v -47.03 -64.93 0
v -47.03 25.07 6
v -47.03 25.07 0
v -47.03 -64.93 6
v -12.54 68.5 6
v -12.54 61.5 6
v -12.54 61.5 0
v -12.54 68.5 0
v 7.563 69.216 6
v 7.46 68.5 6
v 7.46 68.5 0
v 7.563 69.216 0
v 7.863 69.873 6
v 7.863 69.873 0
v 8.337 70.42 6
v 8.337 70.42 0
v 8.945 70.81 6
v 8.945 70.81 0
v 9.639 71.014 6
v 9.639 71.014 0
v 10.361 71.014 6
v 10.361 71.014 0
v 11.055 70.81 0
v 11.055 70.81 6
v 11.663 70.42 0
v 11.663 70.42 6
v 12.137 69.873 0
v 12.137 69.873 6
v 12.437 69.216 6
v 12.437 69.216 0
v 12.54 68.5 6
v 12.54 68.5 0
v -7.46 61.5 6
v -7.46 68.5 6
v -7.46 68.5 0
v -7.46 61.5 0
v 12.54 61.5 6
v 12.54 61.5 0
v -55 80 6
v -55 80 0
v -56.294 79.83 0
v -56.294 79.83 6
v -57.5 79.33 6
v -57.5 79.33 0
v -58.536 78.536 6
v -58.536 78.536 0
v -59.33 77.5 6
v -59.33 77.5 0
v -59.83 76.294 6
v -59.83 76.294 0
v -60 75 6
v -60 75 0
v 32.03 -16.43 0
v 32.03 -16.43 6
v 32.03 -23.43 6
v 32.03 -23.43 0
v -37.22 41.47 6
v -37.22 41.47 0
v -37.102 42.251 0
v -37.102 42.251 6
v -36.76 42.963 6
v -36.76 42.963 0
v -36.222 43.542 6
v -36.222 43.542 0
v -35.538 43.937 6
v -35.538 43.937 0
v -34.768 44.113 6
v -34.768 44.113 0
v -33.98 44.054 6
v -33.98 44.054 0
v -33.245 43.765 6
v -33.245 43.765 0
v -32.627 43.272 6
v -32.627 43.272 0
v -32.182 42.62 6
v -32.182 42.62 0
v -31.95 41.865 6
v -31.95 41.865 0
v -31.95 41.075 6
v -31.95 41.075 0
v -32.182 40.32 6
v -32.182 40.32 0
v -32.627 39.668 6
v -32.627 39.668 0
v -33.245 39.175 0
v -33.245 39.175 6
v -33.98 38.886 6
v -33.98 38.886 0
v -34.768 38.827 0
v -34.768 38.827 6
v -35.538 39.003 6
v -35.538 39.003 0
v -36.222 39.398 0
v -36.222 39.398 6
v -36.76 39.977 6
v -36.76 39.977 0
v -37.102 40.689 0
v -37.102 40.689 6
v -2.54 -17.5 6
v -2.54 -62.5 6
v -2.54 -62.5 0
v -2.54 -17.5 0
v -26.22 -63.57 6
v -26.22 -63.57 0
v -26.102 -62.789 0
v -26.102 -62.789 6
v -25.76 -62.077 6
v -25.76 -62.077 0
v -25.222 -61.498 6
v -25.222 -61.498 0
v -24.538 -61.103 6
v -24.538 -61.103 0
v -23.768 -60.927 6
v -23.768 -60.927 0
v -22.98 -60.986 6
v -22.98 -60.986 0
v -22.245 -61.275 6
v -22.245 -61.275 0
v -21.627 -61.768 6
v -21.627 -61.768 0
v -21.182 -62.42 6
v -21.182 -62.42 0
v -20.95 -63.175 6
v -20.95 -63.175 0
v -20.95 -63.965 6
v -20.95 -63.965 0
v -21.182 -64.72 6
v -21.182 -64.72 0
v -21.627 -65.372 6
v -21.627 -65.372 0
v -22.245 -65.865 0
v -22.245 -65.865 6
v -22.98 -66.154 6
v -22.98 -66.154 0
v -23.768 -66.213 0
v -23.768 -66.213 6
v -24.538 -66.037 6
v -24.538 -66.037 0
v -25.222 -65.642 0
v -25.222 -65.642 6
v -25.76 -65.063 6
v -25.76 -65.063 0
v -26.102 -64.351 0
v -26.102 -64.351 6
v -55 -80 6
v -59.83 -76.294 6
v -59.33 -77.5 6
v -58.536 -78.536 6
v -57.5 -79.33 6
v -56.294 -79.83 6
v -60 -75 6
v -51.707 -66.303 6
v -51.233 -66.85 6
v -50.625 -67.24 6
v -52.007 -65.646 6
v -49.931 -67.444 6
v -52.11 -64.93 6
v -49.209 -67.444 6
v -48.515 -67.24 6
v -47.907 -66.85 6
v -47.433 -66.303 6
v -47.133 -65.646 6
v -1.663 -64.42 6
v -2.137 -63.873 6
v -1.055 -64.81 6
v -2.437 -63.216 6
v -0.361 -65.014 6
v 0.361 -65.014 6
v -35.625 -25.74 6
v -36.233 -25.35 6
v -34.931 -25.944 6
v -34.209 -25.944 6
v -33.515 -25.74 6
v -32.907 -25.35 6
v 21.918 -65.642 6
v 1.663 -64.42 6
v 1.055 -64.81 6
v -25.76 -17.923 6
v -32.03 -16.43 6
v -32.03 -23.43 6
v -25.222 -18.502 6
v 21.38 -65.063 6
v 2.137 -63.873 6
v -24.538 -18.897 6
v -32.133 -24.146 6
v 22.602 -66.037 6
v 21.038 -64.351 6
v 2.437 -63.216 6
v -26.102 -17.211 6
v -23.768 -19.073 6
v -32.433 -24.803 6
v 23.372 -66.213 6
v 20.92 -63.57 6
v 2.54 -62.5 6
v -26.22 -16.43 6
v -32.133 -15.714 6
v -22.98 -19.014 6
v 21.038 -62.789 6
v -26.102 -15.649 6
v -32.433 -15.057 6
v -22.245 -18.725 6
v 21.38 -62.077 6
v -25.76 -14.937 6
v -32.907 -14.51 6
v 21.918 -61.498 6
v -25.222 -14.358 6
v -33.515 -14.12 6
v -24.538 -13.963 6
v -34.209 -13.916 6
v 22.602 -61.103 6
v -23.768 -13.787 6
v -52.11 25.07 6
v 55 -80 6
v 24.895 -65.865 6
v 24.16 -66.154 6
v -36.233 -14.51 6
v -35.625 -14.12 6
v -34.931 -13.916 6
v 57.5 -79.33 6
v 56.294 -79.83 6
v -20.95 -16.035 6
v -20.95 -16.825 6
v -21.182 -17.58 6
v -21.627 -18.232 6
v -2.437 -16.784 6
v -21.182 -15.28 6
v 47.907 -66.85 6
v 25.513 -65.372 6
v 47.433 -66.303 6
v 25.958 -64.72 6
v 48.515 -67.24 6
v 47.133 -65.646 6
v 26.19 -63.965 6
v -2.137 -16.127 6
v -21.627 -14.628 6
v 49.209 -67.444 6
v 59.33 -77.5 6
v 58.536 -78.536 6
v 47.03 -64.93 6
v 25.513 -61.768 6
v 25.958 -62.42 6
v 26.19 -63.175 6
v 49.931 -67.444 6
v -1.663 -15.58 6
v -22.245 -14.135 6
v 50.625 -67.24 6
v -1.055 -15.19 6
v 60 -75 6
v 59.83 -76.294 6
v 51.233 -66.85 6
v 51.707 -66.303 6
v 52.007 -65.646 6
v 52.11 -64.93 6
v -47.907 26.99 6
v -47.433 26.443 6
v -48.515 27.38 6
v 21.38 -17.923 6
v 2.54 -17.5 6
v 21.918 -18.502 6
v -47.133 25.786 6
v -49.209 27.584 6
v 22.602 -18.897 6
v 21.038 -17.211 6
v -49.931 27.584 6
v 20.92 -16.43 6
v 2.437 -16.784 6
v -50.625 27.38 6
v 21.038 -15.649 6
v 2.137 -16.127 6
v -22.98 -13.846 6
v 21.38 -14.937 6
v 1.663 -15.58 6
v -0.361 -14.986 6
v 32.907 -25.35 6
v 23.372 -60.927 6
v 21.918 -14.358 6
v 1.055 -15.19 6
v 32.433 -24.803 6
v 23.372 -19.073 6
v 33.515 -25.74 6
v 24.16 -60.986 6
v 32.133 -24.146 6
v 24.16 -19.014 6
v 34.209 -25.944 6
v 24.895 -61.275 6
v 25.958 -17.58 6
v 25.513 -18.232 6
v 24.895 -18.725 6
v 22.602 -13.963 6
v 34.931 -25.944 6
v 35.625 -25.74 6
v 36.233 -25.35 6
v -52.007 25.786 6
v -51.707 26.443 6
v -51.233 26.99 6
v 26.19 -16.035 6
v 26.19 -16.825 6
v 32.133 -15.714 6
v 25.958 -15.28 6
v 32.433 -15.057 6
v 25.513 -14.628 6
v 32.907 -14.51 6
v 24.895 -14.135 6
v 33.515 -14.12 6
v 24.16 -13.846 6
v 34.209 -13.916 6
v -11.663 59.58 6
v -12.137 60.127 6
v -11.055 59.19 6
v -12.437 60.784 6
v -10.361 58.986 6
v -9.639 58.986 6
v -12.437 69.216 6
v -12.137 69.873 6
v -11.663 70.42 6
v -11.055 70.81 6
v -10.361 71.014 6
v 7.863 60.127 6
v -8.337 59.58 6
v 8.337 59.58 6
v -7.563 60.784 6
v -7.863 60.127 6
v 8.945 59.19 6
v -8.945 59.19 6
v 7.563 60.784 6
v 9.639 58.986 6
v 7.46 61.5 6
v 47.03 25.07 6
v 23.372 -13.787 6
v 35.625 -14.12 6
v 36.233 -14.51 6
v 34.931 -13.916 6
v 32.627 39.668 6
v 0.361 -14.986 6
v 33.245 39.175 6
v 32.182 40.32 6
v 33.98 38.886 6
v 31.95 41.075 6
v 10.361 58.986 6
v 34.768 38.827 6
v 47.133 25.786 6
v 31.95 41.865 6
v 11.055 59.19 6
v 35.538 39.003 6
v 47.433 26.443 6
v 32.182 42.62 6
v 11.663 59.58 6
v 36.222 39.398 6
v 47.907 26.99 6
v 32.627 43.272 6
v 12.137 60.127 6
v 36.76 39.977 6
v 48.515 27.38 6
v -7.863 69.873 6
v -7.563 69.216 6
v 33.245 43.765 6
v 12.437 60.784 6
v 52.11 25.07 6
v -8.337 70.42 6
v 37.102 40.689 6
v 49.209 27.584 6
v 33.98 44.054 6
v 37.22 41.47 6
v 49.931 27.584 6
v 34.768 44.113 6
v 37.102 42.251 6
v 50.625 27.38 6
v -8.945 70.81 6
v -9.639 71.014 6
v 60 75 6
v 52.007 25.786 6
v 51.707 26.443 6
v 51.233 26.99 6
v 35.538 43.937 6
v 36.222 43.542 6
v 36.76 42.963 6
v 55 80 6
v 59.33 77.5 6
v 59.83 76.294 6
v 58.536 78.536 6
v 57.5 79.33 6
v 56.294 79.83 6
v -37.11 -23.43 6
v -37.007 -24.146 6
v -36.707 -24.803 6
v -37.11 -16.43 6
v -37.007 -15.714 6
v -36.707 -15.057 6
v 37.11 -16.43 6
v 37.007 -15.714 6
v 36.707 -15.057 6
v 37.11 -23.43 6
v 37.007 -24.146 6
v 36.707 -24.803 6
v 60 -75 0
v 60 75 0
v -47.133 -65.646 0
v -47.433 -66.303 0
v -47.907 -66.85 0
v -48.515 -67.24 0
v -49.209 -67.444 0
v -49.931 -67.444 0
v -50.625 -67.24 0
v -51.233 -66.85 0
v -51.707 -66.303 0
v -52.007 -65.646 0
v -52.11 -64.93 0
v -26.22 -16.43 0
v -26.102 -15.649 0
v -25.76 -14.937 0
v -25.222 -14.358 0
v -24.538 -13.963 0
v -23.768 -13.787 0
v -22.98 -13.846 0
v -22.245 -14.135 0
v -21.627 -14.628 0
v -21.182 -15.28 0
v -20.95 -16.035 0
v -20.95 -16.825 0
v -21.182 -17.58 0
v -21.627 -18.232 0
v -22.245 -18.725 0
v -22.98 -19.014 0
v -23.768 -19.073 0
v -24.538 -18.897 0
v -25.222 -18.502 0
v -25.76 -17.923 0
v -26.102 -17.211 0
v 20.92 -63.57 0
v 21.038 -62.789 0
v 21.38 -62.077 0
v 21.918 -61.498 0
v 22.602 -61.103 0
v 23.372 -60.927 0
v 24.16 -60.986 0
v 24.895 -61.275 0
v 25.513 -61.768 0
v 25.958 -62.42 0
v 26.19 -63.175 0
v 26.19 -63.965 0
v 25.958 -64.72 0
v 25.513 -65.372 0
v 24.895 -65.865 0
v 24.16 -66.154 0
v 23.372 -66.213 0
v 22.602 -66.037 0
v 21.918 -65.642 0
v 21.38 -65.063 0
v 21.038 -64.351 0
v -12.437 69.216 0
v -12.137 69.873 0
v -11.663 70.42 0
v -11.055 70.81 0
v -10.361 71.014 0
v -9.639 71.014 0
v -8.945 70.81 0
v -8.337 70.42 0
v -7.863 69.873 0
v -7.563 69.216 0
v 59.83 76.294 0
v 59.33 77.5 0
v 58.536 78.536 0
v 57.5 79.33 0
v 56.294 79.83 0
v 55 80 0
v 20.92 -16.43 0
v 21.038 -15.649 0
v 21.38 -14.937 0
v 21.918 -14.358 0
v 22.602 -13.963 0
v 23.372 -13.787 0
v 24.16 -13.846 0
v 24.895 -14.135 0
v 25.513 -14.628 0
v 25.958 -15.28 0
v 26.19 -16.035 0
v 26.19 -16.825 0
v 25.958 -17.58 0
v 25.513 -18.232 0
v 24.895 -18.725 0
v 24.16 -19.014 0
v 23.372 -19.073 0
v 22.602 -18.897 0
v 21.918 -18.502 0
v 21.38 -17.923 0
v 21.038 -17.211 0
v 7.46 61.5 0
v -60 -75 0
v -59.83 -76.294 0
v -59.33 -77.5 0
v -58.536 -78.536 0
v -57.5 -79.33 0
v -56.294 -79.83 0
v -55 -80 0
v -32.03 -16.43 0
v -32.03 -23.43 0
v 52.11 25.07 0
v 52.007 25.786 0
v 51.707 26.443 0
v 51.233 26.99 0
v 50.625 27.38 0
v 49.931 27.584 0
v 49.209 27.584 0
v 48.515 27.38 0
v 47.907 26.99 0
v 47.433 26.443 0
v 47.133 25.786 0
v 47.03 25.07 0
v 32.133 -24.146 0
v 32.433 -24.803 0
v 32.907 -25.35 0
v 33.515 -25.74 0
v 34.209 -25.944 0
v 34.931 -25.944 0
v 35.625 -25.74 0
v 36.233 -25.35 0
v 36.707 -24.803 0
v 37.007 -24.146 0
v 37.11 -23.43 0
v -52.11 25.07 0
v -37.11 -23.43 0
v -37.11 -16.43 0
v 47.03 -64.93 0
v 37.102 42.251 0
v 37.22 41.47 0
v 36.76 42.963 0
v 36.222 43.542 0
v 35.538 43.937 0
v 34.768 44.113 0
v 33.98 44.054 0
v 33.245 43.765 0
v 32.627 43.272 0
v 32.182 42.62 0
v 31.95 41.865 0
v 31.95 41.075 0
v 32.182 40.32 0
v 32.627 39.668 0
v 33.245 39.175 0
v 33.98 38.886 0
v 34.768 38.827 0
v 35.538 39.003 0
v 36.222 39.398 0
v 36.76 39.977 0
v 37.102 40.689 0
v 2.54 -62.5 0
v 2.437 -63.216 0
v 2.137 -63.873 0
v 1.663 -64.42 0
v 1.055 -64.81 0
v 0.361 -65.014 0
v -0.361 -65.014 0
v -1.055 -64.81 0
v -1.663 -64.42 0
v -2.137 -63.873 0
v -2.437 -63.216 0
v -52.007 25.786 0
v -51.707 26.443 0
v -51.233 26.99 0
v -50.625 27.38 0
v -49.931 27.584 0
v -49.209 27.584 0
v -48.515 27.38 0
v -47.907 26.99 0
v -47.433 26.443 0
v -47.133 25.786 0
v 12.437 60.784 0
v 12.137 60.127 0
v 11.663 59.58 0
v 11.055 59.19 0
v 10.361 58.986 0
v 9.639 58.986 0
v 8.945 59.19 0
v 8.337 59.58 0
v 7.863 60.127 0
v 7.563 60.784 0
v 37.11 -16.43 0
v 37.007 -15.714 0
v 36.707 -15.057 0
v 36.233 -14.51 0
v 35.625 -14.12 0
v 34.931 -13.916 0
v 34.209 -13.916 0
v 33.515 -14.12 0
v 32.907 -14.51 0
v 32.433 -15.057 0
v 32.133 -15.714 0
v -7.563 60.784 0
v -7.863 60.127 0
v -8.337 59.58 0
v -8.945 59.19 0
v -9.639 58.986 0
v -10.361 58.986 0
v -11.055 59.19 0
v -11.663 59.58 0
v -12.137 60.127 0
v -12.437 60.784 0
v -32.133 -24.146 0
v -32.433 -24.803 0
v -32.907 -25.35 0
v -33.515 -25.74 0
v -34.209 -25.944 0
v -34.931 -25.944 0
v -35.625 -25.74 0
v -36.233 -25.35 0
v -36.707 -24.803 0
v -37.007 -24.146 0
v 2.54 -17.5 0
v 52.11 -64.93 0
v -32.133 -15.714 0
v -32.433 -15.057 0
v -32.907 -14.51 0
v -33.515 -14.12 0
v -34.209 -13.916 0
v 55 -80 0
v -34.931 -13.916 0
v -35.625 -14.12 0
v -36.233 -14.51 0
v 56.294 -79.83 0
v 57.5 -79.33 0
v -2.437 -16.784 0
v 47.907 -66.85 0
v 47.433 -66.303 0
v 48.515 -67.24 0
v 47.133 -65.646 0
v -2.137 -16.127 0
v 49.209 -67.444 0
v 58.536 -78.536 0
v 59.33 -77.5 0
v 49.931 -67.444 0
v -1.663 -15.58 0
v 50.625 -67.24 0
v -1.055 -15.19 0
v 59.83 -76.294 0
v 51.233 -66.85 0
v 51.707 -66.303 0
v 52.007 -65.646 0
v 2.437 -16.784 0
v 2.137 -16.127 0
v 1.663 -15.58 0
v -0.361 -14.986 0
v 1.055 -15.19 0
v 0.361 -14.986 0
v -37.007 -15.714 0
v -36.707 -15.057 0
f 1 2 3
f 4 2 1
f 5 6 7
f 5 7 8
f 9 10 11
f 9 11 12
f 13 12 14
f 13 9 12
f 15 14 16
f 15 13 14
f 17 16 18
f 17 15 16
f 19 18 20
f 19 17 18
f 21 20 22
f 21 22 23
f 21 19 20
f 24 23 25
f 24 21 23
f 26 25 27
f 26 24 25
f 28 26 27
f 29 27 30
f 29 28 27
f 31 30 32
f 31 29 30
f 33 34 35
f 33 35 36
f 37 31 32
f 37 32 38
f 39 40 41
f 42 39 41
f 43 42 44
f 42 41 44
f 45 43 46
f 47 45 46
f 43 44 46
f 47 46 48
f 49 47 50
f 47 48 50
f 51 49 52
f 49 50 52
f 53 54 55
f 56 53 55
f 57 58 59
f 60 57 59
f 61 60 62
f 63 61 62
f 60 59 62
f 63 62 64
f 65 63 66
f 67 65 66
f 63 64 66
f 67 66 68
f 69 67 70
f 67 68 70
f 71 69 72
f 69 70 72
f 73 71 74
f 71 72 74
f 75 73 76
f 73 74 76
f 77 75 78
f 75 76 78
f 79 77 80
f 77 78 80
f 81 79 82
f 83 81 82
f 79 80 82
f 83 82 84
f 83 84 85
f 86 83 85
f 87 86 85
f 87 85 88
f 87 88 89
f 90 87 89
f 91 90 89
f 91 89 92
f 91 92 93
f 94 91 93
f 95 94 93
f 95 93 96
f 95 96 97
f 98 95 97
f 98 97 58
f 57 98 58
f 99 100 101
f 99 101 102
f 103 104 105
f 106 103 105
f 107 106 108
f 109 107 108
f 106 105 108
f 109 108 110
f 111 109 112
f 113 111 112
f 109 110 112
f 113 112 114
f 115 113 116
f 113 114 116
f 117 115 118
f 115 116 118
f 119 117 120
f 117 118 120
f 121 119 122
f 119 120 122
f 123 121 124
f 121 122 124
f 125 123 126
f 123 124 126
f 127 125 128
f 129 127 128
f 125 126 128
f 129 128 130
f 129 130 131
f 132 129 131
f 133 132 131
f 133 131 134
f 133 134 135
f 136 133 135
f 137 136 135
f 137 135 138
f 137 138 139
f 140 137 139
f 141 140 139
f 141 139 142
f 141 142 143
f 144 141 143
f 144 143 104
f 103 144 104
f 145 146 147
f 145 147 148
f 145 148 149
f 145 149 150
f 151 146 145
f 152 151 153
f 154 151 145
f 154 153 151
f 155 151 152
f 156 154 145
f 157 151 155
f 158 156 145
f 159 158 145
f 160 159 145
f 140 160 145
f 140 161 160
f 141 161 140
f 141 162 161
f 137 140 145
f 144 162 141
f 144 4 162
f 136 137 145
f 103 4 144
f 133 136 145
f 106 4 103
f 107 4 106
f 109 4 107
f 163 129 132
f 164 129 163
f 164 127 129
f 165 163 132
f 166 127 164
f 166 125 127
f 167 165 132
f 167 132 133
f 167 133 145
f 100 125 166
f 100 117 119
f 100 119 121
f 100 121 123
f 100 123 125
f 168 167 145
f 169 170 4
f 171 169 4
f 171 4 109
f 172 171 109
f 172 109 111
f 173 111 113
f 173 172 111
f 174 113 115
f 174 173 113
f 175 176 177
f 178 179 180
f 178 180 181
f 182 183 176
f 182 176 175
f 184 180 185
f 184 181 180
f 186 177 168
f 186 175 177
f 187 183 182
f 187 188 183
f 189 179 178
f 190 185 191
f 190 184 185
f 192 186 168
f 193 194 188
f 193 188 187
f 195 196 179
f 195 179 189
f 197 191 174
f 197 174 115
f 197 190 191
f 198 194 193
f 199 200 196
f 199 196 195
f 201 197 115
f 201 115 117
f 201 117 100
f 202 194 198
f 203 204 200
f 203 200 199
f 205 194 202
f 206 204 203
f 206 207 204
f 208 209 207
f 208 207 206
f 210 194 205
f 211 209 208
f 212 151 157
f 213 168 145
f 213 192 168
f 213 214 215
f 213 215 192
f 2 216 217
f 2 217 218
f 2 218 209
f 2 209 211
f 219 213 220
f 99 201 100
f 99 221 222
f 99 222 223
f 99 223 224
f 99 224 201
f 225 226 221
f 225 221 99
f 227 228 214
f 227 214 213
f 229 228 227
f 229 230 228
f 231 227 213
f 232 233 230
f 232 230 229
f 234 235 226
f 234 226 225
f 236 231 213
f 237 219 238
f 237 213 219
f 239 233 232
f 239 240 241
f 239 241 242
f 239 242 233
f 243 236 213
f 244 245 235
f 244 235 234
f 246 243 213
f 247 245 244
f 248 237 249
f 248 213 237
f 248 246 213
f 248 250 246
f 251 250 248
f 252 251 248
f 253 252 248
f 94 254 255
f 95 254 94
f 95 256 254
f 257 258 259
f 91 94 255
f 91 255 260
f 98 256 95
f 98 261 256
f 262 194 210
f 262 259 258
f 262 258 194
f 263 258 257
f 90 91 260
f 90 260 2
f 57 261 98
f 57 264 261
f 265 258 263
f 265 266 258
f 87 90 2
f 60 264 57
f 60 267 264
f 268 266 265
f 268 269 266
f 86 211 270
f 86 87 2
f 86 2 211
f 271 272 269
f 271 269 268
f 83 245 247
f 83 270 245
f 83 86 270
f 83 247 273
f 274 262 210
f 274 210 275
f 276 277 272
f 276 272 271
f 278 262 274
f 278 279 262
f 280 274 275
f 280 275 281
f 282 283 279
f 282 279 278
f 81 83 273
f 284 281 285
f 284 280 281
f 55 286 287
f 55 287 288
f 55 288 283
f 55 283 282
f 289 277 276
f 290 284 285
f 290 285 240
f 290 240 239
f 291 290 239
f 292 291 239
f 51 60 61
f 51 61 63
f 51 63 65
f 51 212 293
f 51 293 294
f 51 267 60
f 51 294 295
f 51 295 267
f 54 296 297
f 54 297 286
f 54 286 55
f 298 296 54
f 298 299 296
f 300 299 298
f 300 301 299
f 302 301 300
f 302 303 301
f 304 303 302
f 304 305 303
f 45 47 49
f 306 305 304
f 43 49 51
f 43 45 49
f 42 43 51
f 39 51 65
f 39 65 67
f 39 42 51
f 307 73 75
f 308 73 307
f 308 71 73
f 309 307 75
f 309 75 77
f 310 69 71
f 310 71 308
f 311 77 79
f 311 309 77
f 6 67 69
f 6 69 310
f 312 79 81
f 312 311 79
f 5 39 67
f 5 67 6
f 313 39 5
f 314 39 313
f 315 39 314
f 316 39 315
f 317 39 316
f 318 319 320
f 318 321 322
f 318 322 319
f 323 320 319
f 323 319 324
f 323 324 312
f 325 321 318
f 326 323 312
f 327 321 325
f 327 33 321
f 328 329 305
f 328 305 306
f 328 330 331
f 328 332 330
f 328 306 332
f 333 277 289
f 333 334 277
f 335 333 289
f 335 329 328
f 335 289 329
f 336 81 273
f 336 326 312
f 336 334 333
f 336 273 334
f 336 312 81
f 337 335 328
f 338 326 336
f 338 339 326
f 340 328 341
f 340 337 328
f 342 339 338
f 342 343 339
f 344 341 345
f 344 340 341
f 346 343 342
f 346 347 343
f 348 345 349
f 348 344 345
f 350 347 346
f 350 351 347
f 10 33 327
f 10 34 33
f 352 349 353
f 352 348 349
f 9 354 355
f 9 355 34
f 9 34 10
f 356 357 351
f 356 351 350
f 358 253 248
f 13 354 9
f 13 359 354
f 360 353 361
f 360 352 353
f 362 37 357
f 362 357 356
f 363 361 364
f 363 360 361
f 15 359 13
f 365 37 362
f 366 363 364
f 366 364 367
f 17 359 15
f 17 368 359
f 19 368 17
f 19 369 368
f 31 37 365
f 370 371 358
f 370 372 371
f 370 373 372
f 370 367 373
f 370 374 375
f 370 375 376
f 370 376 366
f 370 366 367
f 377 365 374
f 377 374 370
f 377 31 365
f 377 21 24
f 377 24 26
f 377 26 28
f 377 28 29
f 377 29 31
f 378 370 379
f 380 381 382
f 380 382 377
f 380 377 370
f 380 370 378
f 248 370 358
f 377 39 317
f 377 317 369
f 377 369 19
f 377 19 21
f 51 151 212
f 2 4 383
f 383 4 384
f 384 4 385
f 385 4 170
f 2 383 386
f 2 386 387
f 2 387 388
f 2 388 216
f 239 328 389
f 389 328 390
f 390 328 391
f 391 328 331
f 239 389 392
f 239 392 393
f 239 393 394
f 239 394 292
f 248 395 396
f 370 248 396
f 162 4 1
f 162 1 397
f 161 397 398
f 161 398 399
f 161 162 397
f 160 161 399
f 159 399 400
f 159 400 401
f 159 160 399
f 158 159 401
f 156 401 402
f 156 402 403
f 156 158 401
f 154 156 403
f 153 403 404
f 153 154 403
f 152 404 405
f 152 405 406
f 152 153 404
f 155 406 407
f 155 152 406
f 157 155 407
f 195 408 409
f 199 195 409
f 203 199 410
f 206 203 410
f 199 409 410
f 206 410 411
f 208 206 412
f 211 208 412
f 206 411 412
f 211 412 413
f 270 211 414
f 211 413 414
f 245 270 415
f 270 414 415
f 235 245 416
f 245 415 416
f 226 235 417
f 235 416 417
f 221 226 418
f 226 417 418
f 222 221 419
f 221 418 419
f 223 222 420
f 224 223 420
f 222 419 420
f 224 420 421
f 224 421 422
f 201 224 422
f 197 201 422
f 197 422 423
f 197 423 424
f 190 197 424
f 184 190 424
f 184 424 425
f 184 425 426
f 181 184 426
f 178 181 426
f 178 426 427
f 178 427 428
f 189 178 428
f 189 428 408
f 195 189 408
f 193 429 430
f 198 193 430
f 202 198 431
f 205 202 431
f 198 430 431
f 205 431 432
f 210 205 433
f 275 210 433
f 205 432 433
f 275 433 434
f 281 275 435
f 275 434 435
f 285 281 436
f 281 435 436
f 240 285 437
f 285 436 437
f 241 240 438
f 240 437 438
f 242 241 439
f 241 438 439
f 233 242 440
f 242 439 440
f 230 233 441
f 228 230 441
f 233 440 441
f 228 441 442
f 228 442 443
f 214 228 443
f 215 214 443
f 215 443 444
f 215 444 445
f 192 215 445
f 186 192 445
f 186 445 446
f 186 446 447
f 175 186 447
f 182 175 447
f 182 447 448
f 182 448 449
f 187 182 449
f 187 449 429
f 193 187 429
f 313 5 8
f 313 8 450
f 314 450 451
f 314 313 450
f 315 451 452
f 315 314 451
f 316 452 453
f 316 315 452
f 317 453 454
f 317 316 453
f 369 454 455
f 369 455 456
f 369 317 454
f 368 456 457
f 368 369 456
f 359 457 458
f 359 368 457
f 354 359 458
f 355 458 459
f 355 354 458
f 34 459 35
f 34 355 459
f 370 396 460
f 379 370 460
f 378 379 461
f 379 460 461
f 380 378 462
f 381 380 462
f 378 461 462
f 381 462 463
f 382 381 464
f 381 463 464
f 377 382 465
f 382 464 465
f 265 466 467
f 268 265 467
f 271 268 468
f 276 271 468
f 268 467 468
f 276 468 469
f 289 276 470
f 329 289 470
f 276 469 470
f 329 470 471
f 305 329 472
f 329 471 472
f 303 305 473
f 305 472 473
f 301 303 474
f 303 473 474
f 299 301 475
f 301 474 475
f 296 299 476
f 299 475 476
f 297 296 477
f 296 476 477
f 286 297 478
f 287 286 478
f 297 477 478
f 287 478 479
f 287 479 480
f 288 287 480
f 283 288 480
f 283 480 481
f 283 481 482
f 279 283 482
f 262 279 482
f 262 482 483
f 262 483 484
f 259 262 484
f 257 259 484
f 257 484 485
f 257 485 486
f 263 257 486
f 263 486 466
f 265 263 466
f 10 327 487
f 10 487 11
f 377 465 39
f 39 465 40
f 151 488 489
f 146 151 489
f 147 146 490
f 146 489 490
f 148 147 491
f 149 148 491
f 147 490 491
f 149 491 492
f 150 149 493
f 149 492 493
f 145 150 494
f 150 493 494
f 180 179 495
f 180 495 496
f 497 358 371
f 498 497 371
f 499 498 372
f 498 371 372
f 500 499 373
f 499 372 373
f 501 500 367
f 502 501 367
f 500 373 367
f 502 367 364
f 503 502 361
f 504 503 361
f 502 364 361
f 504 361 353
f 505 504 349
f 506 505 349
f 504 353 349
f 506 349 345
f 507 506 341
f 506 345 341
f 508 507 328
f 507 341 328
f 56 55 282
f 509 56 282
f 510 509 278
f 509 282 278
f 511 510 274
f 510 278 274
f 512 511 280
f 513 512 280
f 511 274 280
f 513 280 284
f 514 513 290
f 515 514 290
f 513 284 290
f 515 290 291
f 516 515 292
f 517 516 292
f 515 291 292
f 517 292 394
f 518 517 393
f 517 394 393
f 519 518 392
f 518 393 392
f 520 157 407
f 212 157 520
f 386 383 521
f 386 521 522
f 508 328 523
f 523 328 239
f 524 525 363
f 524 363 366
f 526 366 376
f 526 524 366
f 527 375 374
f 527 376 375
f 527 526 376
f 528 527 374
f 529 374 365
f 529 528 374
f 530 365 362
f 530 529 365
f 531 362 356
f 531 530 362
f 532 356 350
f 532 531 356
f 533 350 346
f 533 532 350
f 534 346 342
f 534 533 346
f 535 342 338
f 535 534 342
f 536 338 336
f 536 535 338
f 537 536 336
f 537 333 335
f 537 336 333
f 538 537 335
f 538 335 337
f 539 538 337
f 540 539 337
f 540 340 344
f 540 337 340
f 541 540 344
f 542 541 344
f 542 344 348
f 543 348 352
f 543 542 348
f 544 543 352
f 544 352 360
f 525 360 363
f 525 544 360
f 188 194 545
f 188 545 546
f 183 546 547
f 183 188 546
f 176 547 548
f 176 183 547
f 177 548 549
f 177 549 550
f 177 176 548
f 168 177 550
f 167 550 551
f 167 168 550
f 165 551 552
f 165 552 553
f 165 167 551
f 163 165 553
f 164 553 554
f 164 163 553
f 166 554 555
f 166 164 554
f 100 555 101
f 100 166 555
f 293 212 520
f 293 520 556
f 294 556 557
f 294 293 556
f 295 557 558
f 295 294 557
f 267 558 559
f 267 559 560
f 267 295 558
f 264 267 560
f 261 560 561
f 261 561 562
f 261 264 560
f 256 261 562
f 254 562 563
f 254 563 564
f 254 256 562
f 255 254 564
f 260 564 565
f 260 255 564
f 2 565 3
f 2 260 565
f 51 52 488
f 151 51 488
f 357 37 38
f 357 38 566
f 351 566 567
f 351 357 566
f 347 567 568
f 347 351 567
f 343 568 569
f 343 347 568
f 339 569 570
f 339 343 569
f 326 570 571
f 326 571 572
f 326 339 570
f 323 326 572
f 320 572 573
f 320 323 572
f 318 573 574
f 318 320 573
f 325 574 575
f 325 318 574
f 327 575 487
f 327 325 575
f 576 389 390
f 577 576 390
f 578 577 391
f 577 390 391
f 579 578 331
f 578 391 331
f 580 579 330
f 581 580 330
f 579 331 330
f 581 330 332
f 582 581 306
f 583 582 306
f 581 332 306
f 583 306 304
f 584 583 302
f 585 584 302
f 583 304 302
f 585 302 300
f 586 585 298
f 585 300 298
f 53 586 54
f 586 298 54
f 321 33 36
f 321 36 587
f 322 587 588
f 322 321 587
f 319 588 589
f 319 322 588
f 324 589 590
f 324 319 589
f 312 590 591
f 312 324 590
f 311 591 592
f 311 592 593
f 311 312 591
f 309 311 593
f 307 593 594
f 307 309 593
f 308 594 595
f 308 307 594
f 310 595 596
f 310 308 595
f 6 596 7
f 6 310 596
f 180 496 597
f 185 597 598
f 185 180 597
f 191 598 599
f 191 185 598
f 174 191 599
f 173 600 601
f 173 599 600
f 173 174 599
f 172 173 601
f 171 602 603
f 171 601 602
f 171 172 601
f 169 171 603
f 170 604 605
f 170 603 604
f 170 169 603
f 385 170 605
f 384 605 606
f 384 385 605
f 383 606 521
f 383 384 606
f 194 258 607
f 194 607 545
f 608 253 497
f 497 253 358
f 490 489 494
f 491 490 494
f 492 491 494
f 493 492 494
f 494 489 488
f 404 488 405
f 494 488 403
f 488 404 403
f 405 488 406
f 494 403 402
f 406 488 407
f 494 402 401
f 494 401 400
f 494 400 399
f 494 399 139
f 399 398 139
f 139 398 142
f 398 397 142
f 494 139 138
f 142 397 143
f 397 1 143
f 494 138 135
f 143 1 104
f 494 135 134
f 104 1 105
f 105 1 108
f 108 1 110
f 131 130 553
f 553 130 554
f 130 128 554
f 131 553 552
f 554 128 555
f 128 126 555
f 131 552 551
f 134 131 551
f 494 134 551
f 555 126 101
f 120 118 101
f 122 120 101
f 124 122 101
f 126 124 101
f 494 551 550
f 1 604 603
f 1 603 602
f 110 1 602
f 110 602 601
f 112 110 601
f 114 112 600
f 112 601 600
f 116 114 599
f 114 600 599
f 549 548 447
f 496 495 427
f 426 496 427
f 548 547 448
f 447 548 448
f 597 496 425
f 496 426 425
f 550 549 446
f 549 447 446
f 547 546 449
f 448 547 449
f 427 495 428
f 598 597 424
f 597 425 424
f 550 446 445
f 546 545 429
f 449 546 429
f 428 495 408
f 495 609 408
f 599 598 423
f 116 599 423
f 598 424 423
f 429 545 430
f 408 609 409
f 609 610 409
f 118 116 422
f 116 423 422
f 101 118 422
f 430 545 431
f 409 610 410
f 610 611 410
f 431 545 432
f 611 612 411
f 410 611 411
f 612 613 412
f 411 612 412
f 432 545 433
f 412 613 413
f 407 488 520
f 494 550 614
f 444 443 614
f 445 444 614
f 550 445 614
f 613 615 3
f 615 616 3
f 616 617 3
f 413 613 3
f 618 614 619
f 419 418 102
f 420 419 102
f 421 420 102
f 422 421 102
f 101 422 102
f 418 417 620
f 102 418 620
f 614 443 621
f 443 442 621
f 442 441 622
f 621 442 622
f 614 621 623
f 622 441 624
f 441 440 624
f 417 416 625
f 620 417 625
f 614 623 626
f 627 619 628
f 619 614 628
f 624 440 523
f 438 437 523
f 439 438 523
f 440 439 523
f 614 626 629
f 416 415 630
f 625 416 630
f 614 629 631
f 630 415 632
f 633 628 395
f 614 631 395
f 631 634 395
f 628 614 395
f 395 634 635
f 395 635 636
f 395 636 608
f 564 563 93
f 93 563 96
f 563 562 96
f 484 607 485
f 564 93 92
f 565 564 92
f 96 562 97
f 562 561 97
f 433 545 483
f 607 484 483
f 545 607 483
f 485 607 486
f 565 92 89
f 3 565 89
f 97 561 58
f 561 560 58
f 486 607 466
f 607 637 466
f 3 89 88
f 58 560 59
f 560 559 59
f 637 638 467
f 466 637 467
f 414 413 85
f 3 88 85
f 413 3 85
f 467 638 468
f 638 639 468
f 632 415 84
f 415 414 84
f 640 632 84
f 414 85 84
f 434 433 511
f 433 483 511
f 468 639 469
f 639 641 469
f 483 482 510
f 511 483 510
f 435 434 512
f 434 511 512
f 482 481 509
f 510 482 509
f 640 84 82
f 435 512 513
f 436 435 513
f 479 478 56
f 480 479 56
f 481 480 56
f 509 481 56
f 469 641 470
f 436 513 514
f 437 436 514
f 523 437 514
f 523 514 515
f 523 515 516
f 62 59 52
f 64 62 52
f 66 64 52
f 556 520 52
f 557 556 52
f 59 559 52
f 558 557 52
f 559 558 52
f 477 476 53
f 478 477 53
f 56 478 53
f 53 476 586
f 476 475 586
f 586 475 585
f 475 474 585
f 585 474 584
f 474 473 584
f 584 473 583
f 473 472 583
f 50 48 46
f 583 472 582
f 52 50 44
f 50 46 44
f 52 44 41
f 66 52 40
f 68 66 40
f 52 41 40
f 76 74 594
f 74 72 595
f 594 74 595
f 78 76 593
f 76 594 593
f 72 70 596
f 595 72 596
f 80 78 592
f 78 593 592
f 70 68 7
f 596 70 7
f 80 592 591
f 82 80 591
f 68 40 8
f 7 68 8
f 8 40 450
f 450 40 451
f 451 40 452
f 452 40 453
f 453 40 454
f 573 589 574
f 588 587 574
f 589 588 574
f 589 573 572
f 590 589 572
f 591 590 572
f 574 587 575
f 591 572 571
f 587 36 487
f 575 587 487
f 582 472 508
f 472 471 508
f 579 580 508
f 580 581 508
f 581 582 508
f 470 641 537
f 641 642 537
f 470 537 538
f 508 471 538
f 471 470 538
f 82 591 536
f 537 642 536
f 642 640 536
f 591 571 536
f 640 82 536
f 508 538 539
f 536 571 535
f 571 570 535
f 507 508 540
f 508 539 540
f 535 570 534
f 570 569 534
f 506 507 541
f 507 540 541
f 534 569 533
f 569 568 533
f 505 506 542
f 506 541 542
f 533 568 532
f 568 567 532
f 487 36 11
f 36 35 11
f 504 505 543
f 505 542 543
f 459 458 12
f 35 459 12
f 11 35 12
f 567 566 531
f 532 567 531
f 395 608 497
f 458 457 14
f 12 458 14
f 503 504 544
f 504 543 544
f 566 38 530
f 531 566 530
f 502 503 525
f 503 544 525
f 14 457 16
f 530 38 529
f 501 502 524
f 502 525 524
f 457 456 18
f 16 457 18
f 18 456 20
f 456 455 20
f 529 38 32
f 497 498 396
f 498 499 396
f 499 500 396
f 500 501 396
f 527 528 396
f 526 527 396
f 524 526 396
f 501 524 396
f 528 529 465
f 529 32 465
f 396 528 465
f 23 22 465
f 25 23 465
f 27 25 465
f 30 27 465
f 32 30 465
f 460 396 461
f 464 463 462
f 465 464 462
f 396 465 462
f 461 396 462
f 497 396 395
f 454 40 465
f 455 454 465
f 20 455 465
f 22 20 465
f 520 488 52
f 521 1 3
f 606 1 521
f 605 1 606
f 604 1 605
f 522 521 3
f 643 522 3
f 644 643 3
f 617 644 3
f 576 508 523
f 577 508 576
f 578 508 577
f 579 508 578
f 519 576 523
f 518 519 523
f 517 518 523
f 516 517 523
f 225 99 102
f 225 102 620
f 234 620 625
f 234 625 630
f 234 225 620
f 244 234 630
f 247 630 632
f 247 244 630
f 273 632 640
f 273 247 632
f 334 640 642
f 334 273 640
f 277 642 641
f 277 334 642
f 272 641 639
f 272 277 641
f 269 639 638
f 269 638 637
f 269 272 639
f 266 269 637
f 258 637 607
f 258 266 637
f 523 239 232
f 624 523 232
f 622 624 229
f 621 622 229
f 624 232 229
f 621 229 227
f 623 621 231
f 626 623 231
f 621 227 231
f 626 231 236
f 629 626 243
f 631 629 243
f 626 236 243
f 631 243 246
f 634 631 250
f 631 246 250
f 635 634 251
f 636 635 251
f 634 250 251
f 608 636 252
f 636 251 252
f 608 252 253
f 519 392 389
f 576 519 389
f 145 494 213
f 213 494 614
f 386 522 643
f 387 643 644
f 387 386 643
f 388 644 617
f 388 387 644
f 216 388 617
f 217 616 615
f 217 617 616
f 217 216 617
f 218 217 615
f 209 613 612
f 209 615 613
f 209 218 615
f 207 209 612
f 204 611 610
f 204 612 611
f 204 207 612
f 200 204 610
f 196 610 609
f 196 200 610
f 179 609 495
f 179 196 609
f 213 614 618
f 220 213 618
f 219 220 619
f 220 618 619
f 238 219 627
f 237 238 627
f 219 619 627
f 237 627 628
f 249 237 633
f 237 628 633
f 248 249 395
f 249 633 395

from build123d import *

# Parameters (mm, degrees)
BOSS_EXTRUDE1_DEPTH  = 6
CUT_EXTRUDE1_DEPTH   = 6
M5_CLEARANCE_HOLE1_D = 5.3
CUT_EXTRUDE2_DEPTH   = 22
M5_CLEARANCE_HOLE2_D = 5.3
CUT_EXTRUDE3_DEPTH   = 6
CUT_EXTRUDE4_DEPTH   = 6


with BuildPart() as part:
    # Sketch2 → Boss-Extrude1 (new body)
    with BuildSketch(Plane.XY):
        with BuildLine():
            Line((-55, -80), (55, -80))
            ThreePointArc((55, -80), (58.535533906, -78.535533906), (60, -75))
            Line((60, -75), (60, 75))
            ThreePointArc((60, 75), (58.535533906, 78.535533906), (55, 80))
            Line((55, 80), (-55, 80))
            ThreePointArc((-55, 80), (-58.535533906, 78.535533906), (-60, 75))
            Line((-60, 75), (-60, -75))
            ThreePointArc((-60, -75), (-58.535533906, -78.535533906), (-55, -80))
        make_face()
    extrude(amount=BOSS_EXTRUDE1_DEPTH)

    # Sketch3 → Cut-Extrude1 (cut)
    with BuildSketch(Plane.XY.offset(6)):
        with BuildLine():
            Line((2.54, -17.5), (2.54, -62.5))
            ThreePointArc((2.54, -62.5), (0, -65.04), (-2.54, -62.5))
            Line((-2.54, -62.5), (-2.54, -17.5))
            ThreePointArc((-2.54, -17.5), (0, -14.96), (2.54, -17.5))
        make_face()
    extrude(amount=-CUT_EXTRUDE1_DEPTH, mode=Mode.SUBTRACT)

    # M5 Clearance Hole1 (through all)
    with Locations(Plane.XY.offset(6)):
        with Locations((-23.57, -63.57), (-23.57, -16.43), (23.57, -16.43), (23.57, -63.57)):
            Hole(M5_CLEARANCE_HOLE1_D / 2)

    # Sketch6 → Cut-Extrude2 (cut)
    with BuildSketch(Plane.XY.offset(6)):
        with BuildLine():
            Line((-32.03, -16.43), (-32.03, -23.43))
            ThreePointArc((-32.03, -23.43), (-34.57, -25.97), (-37.11, -23.43))
            Line((-37.11, -23.43), (-37.11, -16.43))
            ThreePointArc((-37.11, -16.43), (-34.57, -13.89), (-32.03, -16.43))
        make_face()
    cut_extrude2 = extrude(amount=-CUT_EXTRUDE2_DEPTH, mode=Mode.SUBTRACT)

    # M5 Clearance Hole2 (through all)
    with Locations(Plane.XY.offset(6)):
        with Locations((-34.57, 41.47)):
            m5_clearance_hole2 = Hole(M5_CLEARANCE_HOLE2_D / 2)

    # Sketch9 → Cut-Extrude3 (cut)
    with BuildSketch(Plane.XY.offset(6)):
        with BuildLine():
            Line((-47.03, 25.07), (-47.03, -64.93))
            ThreePointArc((-47.03, -64.93), (-49.57, -67.47), (-52.11, -64.93))
            Line((-52.11, -64.93), (-52.11, 25.07))
            ThreePointArc((-52.11, 25.07), (-49.57, 27.61), (-47.03, 25.07))
        make_face()
    cut_extrude3 = extrude(amount=-CUT_EXTRUDE3_DEPTH, mode=Mode.SUBTRACT)

    # Mirror2: Cut-Extrude2, M5 Clearance Hole2, Cut-Extrude3 across plane
    add(cut_extrude2.mirror(Plane(origin=(0, 0, 0), x_dir=(0, 0, 1), z_dir=(1, 0, 0))), mode=Mode.SUBTRACT)
    add(m5_clearance_hole2.mirror(Plane(origin=(0, 0, 0), x_dir=(0, 0, 1), z_dir=(1, 0, 0))), mode=Mode.SUBTRACT)
    add(cut_extrude3.mirror(Plane(origin=(0, 0, 0), x_dir=(0, 0, 1), z_dir=(1, 0, 0))), mode=Mode.SUBTRACT)

    # Sketch11 → Cut-Extrude4 (cut)
    with BuildSketch(Plane.XY.offset(6)):
        with BuildLine():
            Line((-7.46, 68.5), (-7.46, 61.5))
            ThreePointArc((-7.46, 61.5), (-10, 58.96), (-12.54, 61.5))
            Line((-12.54, 61.5), (-12.54, 68.5))
            ThreePointArc((-12.54, 68.5), (-10, 71.04), (-7.46, 68.5))
        make_face()
        with BuildLine():
            Line((12.54, 68.5), (12.54, 61.5))
            ThreePointArc((12.54, 61.5), (10, 58.96), (7.46, 61.5))
            Line((7.46, 61.5), (7.46, 68.5))
            ThreePointArc((7.46, 68.5), (10, 71.04), (12.54, 68.5))
        make_face()
    extrude(amount=-CUT_EXTRUDE4_DEPTH, mode=Mode.SUBTRACT)


solid = part.part
